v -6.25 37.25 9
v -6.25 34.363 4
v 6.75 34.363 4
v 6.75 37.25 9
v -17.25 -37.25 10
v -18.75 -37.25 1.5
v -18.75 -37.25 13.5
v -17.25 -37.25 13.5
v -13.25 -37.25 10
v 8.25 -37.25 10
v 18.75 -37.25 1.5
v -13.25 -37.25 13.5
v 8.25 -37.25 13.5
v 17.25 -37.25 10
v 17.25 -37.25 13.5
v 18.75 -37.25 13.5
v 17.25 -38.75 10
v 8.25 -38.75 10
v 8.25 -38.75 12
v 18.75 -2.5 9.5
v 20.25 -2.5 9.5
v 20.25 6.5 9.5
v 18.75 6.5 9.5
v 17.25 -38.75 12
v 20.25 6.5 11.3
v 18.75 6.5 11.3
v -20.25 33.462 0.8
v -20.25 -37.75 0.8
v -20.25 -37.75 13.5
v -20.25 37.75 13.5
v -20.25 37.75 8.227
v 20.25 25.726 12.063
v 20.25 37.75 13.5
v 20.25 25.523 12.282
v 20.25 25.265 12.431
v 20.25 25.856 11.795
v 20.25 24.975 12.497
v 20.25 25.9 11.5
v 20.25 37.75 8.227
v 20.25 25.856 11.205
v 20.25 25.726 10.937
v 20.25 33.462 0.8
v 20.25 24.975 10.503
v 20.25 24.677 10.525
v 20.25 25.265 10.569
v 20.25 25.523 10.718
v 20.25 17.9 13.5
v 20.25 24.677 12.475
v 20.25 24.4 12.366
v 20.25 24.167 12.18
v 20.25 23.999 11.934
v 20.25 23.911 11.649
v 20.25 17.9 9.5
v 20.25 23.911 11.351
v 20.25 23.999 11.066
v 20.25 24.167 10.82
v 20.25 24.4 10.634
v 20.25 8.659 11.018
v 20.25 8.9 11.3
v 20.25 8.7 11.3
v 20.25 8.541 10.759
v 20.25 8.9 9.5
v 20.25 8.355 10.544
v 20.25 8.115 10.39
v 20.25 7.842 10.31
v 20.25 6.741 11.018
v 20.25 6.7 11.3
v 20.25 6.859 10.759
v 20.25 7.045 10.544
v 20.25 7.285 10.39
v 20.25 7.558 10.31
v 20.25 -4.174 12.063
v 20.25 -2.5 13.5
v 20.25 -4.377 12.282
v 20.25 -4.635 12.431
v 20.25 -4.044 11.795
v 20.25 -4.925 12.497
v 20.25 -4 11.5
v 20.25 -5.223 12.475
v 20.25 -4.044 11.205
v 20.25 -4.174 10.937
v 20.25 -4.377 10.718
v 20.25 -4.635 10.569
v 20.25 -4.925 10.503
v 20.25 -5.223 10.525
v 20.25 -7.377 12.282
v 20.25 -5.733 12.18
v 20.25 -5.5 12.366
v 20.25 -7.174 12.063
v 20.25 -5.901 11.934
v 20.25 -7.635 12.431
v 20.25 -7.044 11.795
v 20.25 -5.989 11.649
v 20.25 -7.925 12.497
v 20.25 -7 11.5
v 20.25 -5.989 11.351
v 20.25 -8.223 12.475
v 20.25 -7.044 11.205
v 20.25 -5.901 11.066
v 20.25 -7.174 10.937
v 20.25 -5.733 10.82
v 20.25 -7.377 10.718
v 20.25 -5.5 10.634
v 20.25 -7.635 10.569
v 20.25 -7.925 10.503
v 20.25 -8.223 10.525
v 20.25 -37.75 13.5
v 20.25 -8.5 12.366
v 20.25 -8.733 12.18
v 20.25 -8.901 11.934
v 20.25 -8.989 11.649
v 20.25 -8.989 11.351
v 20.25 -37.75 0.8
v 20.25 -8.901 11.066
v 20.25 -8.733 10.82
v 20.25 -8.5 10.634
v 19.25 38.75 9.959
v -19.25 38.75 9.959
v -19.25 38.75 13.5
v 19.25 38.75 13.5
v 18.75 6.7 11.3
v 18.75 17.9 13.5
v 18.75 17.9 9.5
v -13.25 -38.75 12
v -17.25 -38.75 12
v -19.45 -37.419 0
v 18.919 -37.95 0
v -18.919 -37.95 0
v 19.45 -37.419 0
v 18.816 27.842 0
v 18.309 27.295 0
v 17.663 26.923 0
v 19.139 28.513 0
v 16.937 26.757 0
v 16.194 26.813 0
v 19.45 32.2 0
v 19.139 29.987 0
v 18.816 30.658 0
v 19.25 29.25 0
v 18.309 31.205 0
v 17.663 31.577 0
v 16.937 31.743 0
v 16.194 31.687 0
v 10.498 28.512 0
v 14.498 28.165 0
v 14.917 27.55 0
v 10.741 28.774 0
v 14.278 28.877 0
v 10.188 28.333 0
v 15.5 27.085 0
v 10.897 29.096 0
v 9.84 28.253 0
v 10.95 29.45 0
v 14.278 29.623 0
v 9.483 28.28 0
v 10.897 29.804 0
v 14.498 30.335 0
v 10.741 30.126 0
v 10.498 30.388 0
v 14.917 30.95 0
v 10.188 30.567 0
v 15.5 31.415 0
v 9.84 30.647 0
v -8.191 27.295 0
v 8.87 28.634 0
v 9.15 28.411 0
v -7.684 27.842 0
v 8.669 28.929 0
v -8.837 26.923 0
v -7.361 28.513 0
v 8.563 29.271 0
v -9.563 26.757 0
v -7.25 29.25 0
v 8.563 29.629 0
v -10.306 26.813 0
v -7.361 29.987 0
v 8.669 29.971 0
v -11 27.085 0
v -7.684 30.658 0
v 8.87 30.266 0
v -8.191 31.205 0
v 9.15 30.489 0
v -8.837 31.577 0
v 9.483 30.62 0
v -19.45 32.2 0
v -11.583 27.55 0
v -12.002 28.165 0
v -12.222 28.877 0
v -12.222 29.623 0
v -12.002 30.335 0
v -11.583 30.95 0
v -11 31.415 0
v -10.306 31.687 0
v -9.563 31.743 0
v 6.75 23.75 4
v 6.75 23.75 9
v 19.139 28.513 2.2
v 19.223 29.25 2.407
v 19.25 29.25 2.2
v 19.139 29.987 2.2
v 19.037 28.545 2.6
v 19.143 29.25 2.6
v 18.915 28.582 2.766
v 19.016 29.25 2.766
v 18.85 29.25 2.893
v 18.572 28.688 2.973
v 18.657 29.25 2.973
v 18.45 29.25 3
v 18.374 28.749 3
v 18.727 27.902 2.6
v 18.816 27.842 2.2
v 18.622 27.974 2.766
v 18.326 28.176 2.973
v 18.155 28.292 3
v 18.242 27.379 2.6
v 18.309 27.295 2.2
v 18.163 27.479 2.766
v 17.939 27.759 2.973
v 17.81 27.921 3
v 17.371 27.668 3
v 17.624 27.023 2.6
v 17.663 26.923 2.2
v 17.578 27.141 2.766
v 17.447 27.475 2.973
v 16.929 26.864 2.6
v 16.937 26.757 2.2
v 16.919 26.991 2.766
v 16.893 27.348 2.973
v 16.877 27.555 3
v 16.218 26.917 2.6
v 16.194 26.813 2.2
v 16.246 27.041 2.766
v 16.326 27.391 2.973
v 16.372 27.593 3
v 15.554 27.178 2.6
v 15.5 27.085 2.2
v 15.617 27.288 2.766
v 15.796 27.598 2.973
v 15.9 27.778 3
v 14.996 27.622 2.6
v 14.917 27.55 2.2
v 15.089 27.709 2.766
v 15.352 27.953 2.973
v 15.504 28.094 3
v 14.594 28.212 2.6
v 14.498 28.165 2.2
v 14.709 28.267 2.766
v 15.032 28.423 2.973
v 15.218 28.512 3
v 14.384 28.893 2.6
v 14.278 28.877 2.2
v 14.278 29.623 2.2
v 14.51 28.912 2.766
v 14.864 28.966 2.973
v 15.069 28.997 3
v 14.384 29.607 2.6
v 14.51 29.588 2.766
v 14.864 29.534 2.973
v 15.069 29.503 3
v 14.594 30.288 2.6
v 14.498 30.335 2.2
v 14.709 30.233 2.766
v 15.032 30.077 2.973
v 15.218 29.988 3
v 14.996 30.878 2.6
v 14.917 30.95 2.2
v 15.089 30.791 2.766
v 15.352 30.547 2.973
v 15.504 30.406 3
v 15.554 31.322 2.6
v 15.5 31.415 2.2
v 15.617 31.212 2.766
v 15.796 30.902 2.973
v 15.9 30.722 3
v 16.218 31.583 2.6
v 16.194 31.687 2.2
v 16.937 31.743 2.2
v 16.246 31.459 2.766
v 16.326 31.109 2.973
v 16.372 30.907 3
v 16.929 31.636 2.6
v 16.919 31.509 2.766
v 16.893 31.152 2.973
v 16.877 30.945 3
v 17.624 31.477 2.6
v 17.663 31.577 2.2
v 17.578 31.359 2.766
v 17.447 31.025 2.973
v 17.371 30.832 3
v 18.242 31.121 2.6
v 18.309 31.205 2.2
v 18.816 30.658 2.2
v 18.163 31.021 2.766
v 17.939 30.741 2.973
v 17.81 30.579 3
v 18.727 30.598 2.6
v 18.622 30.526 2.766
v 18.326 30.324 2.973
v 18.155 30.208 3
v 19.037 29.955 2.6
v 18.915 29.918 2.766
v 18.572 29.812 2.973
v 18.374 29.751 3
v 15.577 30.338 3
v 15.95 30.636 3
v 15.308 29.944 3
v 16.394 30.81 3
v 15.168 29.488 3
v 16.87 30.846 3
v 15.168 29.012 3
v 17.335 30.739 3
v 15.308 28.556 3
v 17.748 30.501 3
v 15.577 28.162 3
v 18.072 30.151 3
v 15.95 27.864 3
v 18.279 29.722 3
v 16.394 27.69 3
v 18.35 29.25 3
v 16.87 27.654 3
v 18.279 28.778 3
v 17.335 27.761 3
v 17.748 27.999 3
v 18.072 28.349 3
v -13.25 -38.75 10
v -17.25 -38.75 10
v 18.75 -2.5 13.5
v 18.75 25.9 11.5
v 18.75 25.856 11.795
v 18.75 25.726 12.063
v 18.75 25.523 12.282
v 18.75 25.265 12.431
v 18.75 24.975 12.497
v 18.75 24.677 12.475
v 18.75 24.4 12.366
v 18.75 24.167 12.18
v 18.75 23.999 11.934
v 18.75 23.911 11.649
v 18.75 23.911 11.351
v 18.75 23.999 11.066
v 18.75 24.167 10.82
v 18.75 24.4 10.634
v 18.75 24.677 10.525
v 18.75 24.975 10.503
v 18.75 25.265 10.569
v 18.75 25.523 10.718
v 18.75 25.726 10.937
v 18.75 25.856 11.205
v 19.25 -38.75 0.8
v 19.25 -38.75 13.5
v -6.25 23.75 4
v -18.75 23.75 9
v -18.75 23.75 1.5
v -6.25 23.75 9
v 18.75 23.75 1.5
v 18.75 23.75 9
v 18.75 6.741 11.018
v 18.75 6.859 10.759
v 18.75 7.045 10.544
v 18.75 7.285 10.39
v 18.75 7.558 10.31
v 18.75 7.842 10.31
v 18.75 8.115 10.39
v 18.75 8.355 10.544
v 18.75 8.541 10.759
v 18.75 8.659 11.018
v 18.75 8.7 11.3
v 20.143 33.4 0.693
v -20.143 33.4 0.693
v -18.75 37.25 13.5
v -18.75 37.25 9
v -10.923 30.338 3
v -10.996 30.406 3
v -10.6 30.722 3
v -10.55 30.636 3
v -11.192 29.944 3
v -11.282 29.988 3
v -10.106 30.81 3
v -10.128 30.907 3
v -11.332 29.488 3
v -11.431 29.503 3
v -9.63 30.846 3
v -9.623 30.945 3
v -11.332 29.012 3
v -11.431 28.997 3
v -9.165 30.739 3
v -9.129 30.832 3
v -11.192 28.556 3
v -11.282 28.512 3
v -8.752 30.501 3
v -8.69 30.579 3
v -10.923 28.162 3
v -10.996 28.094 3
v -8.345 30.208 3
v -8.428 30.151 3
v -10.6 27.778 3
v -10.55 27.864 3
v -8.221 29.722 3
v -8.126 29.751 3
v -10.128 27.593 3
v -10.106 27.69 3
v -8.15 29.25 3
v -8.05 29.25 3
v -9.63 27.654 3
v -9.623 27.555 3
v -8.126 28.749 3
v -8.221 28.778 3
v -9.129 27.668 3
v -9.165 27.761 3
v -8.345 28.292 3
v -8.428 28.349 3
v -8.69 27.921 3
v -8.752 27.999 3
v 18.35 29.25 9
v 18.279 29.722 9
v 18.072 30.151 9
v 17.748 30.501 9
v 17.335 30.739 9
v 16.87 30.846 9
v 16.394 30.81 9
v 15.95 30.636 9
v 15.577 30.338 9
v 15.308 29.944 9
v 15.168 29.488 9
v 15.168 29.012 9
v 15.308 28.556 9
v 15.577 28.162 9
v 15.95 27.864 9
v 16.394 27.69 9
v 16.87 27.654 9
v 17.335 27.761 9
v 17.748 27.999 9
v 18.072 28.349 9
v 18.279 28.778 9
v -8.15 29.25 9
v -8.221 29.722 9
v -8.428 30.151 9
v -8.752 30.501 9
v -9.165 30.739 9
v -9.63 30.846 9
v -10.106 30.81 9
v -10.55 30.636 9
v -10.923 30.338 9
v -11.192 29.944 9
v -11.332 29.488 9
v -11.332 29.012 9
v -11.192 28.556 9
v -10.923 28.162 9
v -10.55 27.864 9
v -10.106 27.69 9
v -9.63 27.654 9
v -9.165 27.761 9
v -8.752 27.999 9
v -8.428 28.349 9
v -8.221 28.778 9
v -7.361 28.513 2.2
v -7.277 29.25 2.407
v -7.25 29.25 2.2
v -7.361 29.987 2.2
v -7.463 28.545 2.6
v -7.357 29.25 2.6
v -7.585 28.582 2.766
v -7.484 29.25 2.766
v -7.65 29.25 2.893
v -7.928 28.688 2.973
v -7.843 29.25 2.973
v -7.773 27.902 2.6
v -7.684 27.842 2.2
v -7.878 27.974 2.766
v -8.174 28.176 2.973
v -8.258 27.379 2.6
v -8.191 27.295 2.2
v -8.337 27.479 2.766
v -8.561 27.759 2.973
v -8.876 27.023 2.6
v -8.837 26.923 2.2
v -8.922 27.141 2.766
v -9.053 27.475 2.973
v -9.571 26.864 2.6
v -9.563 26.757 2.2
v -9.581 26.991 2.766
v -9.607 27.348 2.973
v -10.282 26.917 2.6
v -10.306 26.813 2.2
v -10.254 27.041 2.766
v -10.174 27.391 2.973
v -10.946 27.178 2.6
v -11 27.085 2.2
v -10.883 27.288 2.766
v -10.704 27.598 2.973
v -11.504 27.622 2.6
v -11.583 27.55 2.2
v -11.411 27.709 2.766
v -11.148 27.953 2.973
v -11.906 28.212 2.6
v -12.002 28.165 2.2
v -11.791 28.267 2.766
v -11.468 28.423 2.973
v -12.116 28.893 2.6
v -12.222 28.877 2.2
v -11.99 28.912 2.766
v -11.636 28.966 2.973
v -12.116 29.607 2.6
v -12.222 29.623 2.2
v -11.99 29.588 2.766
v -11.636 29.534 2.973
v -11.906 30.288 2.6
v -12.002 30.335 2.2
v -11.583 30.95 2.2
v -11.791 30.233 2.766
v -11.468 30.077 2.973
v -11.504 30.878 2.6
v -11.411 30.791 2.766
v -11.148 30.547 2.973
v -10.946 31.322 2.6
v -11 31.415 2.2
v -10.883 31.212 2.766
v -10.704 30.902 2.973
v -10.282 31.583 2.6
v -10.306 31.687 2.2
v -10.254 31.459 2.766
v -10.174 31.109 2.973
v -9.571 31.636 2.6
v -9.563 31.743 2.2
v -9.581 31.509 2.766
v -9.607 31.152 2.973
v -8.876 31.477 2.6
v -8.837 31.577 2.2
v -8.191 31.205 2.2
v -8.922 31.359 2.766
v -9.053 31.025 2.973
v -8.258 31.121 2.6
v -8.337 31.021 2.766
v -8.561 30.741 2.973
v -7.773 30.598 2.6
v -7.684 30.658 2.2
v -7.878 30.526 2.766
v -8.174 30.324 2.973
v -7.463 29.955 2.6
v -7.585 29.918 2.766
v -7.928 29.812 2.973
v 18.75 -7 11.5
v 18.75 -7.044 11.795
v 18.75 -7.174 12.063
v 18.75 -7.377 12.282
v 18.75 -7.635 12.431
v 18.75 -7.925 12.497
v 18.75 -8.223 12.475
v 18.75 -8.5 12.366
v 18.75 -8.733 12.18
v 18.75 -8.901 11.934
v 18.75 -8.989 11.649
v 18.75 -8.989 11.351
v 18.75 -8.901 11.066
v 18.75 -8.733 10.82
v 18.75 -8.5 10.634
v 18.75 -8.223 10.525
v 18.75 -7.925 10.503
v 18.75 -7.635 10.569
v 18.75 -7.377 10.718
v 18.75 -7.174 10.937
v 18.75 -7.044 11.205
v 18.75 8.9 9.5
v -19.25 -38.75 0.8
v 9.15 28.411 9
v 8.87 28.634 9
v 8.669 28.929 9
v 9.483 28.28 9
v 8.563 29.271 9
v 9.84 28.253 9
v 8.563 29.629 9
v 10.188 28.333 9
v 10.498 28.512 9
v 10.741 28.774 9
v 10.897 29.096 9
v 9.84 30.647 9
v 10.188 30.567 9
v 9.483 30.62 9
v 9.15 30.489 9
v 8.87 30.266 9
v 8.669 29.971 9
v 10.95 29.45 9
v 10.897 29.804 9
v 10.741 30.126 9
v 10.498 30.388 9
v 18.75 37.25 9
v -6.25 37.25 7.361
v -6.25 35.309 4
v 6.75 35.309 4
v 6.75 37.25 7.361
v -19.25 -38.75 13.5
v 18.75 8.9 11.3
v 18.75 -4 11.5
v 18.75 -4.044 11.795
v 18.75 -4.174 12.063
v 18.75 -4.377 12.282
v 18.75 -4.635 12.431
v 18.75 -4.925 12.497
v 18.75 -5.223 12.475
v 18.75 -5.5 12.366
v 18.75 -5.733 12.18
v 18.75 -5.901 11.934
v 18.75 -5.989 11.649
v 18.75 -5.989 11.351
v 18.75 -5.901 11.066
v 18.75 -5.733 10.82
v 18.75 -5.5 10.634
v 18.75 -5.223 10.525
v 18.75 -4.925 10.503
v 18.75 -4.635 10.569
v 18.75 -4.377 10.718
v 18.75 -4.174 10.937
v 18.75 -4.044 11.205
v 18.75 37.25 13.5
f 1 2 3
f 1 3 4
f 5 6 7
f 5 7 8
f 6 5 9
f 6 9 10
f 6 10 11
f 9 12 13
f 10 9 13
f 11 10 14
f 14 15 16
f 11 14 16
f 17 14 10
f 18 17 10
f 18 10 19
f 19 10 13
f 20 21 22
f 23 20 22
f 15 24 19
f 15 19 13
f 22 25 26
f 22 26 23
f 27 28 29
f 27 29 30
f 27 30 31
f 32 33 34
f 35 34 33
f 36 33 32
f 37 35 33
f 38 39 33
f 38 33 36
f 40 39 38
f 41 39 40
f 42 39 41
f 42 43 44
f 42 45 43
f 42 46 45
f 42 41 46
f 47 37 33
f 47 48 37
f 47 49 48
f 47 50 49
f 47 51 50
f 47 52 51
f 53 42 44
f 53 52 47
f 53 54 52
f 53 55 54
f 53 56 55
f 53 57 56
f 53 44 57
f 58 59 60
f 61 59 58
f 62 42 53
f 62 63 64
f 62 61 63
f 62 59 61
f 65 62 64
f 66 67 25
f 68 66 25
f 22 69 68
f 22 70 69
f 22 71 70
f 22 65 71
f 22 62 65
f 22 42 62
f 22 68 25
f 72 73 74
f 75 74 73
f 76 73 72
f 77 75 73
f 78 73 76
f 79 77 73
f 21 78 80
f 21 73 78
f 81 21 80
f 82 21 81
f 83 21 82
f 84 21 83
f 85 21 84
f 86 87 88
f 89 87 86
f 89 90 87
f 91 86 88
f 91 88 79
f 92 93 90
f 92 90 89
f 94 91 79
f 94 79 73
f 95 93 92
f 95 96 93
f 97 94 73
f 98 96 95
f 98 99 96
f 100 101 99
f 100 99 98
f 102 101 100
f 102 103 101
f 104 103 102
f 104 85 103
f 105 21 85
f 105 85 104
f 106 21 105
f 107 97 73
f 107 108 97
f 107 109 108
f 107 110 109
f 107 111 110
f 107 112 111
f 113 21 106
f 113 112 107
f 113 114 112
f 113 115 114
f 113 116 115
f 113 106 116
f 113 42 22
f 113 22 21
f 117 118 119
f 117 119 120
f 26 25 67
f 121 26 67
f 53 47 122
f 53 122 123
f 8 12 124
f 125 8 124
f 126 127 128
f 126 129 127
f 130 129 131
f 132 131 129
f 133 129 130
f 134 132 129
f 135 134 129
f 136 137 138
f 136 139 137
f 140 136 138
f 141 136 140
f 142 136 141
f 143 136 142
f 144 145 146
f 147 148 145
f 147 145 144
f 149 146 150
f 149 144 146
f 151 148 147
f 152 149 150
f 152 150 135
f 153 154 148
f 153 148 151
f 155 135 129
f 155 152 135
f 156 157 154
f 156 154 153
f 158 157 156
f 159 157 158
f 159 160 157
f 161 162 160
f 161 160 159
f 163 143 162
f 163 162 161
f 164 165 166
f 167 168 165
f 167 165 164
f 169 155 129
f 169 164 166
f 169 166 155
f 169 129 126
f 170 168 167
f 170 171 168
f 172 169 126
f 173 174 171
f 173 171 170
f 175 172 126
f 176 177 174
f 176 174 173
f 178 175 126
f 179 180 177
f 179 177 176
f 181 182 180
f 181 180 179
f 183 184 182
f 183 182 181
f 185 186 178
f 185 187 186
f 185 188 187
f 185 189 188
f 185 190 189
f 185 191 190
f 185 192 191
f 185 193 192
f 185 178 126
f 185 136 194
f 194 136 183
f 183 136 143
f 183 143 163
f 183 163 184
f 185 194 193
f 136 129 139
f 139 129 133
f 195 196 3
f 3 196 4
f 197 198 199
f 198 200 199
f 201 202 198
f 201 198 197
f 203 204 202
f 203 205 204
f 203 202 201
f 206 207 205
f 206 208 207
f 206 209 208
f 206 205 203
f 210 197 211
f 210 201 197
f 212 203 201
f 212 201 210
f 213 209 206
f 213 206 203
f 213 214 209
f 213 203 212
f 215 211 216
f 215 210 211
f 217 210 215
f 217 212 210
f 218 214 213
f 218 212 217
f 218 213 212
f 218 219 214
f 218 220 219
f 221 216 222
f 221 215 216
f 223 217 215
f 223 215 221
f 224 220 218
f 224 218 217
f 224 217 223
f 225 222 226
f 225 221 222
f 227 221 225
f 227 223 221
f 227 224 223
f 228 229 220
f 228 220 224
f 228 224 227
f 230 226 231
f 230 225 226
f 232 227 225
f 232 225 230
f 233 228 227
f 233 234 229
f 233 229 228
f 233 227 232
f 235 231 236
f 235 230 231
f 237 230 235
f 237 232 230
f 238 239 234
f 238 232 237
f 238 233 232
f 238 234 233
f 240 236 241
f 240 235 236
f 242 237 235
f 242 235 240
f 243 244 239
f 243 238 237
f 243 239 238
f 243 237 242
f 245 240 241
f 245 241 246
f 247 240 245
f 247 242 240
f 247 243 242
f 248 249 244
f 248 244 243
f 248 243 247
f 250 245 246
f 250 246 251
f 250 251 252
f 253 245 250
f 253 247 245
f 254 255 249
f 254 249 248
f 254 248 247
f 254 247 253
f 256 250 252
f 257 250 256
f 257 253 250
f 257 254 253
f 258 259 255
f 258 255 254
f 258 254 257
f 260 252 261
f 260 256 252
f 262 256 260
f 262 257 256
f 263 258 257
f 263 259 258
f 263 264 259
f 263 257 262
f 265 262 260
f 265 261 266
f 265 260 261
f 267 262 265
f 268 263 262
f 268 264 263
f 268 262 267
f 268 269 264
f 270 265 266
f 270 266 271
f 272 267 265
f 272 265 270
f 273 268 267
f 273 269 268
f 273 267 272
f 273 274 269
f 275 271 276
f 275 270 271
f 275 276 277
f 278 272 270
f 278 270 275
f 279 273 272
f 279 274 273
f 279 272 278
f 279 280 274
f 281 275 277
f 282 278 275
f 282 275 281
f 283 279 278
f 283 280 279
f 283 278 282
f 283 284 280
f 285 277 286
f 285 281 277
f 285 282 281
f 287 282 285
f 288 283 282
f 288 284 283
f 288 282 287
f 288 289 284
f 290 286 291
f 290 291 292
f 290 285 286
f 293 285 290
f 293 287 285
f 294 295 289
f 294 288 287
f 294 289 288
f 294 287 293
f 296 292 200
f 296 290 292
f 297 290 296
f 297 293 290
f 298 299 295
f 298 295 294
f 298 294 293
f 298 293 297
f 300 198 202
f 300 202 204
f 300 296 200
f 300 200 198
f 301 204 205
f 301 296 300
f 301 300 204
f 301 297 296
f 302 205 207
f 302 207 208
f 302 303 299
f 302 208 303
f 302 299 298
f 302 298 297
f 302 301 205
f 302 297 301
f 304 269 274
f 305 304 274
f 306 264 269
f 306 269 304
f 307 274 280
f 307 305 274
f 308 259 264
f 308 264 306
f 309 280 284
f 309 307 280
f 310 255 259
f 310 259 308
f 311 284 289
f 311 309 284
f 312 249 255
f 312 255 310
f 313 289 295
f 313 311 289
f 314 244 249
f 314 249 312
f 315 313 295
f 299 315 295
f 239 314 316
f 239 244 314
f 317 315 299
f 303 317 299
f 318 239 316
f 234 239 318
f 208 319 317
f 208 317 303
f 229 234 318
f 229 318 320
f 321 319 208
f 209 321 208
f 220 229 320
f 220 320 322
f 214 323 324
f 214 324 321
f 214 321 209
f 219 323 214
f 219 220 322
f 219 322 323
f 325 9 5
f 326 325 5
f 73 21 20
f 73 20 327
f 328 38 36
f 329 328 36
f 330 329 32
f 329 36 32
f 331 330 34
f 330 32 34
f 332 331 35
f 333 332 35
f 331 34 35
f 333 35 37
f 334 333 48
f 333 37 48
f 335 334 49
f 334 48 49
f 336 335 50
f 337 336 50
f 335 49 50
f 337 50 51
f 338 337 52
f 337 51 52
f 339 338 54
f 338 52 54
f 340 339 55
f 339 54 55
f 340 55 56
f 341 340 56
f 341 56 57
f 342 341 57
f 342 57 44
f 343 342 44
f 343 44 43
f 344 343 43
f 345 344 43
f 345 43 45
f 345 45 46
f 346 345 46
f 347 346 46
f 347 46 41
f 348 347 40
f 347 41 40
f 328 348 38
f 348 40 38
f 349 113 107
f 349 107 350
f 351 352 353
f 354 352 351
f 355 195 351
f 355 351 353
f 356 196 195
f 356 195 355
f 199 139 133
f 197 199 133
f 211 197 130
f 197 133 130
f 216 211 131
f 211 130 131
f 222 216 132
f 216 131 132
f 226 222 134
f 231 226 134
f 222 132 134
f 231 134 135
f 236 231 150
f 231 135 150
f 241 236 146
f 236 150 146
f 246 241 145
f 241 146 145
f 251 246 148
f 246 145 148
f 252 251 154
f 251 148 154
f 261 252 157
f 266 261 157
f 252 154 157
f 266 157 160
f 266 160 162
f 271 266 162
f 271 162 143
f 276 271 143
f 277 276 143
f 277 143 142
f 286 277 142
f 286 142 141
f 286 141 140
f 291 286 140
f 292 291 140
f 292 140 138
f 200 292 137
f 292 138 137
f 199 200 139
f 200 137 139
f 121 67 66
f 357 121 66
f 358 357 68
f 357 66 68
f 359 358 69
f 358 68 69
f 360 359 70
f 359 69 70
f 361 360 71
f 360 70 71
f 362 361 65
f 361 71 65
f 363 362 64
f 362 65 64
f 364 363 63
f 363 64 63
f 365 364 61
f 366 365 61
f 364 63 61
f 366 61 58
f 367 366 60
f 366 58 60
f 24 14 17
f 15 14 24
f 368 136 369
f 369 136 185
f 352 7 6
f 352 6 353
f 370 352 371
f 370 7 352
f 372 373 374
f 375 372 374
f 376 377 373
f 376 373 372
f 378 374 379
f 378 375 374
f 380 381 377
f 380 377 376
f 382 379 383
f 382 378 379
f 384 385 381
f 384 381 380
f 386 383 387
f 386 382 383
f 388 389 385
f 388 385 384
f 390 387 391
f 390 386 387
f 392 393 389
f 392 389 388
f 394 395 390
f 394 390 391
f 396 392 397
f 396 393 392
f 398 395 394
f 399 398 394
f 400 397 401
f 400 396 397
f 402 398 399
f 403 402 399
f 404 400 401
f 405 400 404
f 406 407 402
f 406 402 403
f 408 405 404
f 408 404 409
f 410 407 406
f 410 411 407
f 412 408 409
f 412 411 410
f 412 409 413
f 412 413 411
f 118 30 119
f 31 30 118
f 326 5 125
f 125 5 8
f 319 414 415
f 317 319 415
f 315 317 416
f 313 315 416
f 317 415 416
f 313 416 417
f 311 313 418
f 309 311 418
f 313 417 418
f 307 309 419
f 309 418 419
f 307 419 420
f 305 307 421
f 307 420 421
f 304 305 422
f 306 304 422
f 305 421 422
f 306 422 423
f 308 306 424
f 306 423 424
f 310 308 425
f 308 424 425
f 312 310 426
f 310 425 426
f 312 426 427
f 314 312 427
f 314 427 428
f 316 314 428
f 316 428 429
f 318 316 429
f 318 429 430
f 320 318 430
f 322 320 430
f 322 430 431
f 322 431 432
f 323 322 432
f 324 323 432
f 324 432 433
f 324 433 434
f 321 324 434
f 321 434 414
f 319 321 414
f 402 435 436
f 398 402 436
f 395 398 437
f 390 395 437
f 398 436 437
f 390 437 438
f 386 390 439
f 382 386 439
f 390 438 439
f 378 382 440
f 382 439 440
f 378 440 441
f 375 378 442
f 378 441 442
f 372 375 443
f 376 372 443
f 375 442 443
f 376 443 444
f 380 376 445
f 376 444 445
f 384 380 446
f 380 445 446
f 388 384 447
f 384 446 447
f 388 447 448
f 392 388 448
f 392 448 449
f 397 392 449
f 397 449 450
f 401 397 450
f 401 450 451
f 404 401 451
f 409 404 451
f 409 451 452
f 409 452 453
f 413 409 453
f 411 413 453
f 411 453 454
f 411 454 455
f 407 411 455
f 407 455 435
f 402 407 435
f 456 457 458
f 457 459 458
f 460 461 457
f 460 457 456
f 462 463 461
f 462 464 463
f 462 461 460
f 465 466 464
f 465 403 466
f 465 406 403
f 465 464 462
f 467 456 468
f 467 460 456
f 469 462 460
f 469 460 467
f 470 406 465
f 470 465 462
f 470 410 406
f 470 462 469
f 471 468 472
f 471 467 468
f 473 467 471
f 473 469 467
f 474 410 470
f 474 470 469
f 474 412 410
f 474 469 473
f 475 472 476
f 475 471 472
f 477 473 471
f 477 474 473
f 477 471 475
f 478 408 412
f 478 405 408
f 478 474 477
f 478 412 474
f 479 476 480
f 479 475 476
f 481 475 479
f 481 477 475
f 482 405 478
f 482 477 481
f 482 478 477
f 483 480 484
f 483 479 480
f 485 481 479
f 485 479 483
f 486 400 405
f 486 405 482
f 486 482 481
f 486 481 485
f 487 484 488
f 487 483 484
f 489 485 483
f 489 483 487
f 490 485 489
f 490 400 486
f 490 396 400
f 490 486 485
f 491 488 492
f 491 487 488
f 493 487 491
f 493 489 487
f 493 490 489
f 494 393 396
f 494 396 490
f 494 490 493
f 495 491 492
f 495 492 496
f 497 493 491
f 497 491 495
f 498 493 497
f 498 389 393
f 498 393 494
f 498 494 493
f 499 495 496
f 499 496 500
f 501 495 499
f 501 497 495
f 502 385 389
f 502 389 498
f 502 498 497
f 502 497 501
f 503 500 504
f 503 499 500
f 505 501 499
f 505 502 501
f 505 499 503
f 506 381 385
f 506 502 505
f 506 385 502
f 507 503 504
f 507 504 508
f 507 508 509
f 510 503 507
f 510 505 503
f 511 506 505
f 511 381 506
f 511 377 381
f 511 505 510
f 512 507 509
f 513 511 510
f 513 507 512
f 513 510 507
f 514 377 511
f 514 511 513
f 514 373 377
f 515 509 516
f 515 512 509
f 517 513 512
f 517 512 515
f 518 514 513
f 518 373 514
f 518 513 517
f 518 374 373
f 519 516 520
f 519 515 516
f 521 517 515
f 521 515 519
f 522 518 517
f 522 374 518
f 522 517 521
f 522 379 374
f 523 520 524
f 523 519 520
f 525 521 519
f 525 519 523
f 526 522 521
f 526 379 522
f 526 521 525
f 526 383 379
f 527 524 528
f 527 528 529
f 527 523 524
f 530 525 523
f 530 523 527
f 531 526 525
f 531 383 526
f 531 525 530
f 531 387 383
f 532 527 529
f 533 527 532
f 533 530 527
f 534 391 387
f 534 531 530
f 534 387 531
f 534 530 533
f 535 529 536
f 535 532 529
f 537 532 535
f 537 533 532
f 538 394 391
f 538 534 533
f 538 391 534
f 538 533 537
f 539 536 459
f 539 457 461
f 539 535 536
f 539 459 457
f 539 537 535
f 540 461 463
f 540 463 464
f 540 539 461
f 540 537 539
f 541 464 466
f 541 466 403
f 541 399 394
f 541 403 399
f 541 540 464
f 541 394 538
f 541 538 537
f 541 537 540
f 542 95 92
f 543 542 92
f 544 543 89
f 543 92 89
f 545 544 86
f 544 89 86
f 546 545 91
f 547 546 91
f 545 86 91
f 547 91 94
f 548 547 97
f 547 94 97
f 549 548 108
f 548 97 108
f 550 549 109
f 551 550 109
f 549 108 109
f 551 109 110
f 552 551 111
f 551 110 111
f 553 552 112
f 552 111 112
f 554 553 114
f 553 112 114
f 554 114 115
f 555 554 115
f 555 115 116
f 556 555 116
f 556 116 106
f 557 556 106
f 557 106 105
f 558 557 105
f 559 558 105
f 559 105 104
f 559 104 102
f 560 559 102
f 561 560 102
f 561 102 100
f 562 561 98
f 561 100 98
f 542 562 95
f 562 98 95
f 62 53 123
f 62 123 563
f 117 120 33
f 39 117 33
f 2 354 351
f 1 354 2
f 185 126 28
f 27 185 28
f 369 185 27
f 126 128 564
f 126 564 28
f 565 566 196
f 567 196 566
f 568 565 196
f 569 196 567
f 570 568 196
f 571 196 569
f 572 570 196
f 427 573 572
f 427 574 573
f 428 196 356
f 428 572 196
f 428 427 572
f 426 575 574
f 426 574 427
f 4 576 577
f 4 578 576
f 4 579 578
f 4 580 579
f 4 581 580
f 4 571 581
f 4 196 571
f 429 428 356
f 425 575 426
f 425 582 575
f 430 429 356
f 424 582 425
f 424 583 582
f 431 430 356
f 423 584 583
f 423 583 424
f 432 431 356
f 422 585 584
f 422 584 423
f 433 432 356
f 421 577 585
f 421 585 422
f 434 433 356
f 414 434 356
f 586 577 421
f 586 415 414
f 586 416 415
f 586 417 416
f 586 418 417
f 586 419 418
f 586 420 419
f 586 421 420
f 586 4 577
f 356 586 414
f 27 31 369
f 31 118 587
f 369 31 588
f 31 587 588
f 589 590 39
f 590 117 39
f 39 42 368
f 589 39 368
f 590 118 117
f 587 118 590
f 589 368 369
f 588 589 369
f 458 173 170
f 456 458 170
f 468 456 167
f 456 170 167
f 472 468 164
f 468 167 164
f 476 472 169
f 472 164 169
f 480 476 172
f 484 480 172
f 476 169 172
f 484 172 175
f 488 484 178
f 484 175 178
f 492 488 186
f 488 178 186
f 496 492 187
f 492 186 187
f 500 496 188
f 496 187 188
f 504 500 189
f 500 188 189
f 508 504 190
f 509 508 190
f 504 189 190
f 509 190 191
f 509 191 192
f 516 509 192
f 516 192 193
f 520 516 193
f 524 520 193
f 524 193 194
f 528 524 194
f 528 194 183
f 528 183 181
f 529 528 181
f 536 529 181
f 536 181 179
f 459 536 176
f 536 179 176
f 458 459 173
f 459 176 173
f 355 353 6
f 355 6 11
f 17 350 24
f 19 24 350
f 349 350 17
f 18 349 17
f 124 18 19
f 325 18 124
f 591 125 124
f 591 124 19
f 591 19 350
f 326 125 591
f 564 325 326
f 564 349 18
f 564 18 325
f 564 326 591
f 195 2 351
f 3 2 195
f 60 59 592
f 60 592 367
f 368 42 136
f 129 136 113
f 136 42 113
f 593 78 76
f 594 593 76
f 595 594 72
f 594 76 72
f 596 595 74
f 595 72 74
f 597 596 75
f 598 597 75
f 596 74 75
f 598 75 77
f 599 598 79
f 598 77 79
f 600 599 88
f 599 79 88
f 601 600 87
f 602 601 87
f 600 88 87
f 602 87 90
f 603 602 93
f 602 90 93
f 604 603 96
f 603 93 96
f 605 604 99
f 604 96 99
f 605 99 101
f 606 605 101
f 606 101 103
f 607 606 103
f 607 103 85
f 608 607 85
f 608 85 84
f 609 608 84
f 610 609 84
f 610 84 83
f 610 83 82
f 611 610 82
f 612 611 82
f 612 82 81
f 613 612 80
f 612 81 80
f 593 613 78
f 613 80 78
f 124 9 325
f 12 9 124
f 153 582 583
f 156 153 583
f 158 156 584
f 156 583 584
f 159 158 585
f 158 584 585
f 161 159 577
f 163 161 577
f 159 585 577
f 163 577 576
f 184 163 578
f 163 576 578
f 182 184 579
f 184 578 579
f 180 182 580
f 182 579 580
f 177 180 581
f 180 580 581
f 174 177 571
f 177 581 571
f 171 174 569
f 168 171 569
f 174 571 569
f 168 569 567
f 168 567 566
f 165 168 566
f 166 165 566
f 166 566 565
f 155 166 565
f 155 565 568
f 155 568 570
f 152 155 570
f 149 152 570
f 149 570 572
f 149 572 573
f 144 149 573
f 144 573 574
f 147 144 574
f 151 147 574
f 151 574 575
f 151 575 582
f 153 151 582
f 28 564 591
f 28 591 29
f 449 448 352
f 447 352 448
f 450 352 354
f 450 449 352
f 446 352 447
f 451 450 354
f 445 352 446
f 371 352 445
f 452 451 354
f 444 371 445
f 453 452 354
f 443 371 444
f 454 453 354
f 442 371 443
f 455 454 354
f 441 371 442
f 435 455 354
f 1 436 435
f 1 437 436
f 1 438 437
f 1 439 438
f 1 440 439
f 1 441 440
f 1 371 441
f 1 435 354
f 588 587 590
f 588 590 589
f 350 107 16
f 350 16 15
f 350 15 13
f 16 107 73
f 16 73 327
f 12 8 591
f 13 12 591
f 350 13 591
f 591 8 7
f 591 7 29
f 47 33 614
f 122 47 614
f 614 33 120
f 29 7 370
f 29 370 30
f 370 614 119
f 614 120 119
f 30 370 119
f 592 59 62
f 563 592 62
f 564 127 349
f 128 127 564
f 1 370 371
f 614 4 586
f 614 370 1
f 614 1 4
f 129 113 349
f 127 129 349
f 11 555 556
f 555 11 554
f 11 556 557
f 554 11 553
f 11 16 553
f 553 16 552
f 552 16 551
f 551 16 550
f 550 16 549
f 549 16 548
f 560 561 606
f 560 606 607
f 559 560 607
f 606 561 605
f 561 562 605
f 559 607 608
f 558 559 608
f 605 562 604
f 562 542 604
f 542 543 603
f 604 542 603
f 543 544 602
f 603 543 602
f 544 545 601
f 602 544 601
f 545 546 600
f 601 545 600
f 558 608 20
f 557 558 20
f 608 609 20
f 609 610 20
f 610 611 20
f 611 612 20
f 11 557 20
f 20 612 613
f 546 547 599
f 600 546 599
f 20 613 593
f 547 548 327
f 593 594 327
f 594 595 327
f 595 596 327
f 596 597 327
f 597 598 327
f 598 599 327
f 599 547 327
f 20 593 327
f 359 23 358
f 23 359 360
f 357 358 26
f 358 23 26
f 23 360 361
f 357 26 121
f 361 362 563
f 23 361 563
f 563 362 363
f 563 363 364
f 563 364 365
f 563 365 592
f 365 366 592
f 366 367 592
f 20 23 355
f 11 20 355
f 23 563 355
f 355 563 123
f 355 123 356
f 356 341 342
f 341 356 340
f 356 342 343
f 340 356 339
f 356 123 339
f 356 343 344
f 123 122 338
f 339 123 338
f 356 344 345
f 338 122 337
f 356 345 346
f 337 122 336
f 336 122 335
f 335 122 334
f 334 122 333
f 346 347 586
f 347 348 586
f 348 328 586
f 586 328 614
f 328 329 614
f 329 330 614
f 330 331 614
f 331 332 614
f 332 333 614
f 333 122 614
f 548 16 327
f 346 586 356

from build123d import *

# Parameters (mm, degrees)
PAD_DEPTH          = 13.5
SKETCH001_W        = 37.5
SKETCH001_H        = 61
POCKET_DEPTH       = 12
SKETCH002_W        = 13
SKETCH002_H        = 13.5
POCKET012020_DEPTH = 9.5
SKETCH004_W        = 12
SKETCH004_H        = 13.5
SKETCH004_W_2      = 12.5
POCKET012021_DEPTH = 4.5
SKETCH003_R        = 1.6
SKETCH003_R_2      = 1.2
POCKET012022_DEPTH = 9.001
SKETCH006_R        = 2.5
POCKET012023_DEPTH = 3
SKETCH007_R        = 1
POCKET012024_DEPTH = 1.5
POCKET012025_DEPTH = 40.501
PAD016_DEPTH       = 13
SKETCH019_W        = 9
SKETCH019_H        = 2
SKETCH019_W_2      = 4
POCKET012026_DEPTH = 1.501
POCKET012027_DEPTH = 9
POCKET012028_DEPTH = 4
CHAMFER_SIZE       = 0.8
FILLET001_R        = 0.8


with BuildPart() as part:
    # Sketch → Pad (new body)
    with BuildSketch(Plane.XY):
        Polygon((-19.25, 38.75), (19.25, 38.75), (20.25, 37.75), (20.25, -37.75), (19.25, -38.75), (-19.25, -38.75), (-20.25, -37.75), (-20.25, 37.75), align=None)
    extrude(amount=PAD_DEPTH)

    # Sketch001 → Pocket (cut)
    with BuildSketch(Plane.XY.offset(13.5)):
        with Locations((0, -6.75)):
            Rectangle(SKETCH001_W, SKETCH001_H)
    extrude(amount=-POCKET_DEPTH, mode=Mode.SUBTRACT)

    # Sketch002 → Pocket012020 (cut)
    with BuildSketch(Plane.XY.offset(13.5)):
        with Locations((0.25, 30.5)):
            Rectangle(SKETCH002_W, SKETCH002_H)
    extrude(amount=-POCKET012020_DEPTH, mode=Mode.SUBTRACT)

    # Sketch004 → Pocket012021 (cut)
    with BuildSketch(Plane.XY.offset(13.5)):
        with Locations((12.75, 30.5)):
            Rectangle(SKETCH004_W, SKETCH004_H)
        with Locations((-12.5, 30.5)):
            Rectangle(SKETCH004_W_2, SKETCH004_H)
    extrude(amount=-POCKET012021_DEPTH, mode=Mode.SUBTRACT)

    # Sketch003 → Pocket012022 (cut, through all)
    with BuildSketch(Plane.XY.offset(9)):
        with Locations((16.75, 29.25)):
            Circle(SKETCH003_R)
        with Locations((-9.75, 29.25)):
            Circle(SKETCH003_R)
        with Locations((9.75, 29.45)):
            Circle(SKETCH003_R_2)
    extrude(amount=-POCKET012022_DEPTH, mode=Mode.SUBTRACT)

    # Sketch006 → Pocket012023 (cut)
    with BuildSketch(Plane(origin=(0, 0, 0), x_dir=(1, 0, 0), z_dir=(0, 0, -1))):
        with Locations((16.75, -29.25)):
            Circle(SKETCH006_R)
        with Locations((-9.75, -29.25)):
            Circle(SKETCH006_R)
    extrude(amount=-POCKET012023_DEPTH, mode=Mode.SUBTRACT)

    # Sketch007 → Pocket012024 (cut)
    with BuildSketch(Plane.YZ.offset(20.25)):
        with Locations((24.9, 11.5)):
            Circle(SKETCH007_R)
        with Locations((-5, 11.5)):
            Circle(SKETCH007_R)
        with Locations((-8, 11.5)):
            Circle(SKETCH007_R)
        with BuildLine():
            Line((17.9, 13.5), (17.9, 9.5))
            Line((17.9, 9.5), (8.9, 9.5))
            Line((8.9, 11.3), (8.9, 9.5))
            Line((8.9, 11.3), (8.7, 11.3))
            ThreePointArc((6.7, 11.3), (7.7, 10.3), (8.7, 11.3))
            Line((6.5, 11.3), (6.7, 11.3))
            Line((6.5, 11.3), (6.5, 9.5))
            Line((-2.5, 9.5), (6.5, 9.5))
            Line((-2.5, 9.5), (-2.5, 13.5))
            Line((17.9, 13.5), (-2.5, 13.5))
        make_face()
    extrude(amount=-POCKET012024_DEPTH, mode=Mode.SUBTRACT)

    # Sketch017 → Pocket012025 (cut, through all)
    with BuildSketch(Plane.YZ.offset(20.25)):
        Polygon((38.773503, 10), (33, 0), (38.773503, 0), align=None)
    extrude(amount=-POCKET012025_DEPTH, mode=Mode.SUBTRACT)

    # Sketch018 → Pad016 (new body)
    with BuildSketch(Plane.YZ.offset(-6.25)):
        Polygon((37.25, 9), (37.25, 7.361216), (35.309401, 4), (34.363249, 4), align=None)
    extrude(amount=PAD016_DEPTH)

    # Sketch019 → Pocket012026 (cut, through all)
    with BuildSketch(Plane(origin=(0, -37.25, 0), x_dir=(-1, 0, 0), z_dir=(0, 1, 0))):
        with Locations((-12.75, 11)):
            Rectangle(SKETCH019_W, SKETCH019_H)
        with Locations((15.25, 11)):
            Rectangle(SKETCH019_W_2, SKETCH019_H)
    extrude(amount=-POCKET012026_DEPTH, mode=Mode.SUBTRACT)

    # Sketch022 → Pocket012027 (cut)
    with BuildSketch(Plane(origin=(17.25, 0, 0), x_dir=(0, -1, 0), z_dir=(-1, 0, 0))):
        Polygon((38.75, 12), (37.25, 13.5), (37.25, 12), align=None)
    extrude(amount=POCKET012027_DEPTH, mode=Mode.SUBTRACT)

    # Sketch039 → Pocket012028 (cut)
    with BuildSketch(Plane(origin=(-13.25, 0, 0), x_dir=(0, -1, 0), z_dir=(-1, 0, 0))):
        Polygon((38.75, 12), (37.25, 12), (37.25, 13.5), align=None)
    extrude(amount=POCKET012028_DEPTH, mode=Mode.SUBTRACT)

    # Chamfer
    chamfer_edges = [part.edges().sort_by_distance(p)[0] for p in [
        (0, -38.75, 0),
        (-19.75, -38.25, 0),
        (-20.25, -2.375, 0),
        (0, 33, 0),
        (20.25, -2.375, 0),
        (19.75, -38.25, 0),
    ]]
    chamfer(chamfer_edges, length=CHAMFER_SIZE)

    # Fillet001
    fillet001_edges = [part.edges().sort_by_distance(p)[0] for p in [
        (14.25, 29.25, 3),
        (-12.25, 29.25, 3),
    ]]
    fillet(fillet001_edges, radius=FILLET001_R)


solid = part.part
